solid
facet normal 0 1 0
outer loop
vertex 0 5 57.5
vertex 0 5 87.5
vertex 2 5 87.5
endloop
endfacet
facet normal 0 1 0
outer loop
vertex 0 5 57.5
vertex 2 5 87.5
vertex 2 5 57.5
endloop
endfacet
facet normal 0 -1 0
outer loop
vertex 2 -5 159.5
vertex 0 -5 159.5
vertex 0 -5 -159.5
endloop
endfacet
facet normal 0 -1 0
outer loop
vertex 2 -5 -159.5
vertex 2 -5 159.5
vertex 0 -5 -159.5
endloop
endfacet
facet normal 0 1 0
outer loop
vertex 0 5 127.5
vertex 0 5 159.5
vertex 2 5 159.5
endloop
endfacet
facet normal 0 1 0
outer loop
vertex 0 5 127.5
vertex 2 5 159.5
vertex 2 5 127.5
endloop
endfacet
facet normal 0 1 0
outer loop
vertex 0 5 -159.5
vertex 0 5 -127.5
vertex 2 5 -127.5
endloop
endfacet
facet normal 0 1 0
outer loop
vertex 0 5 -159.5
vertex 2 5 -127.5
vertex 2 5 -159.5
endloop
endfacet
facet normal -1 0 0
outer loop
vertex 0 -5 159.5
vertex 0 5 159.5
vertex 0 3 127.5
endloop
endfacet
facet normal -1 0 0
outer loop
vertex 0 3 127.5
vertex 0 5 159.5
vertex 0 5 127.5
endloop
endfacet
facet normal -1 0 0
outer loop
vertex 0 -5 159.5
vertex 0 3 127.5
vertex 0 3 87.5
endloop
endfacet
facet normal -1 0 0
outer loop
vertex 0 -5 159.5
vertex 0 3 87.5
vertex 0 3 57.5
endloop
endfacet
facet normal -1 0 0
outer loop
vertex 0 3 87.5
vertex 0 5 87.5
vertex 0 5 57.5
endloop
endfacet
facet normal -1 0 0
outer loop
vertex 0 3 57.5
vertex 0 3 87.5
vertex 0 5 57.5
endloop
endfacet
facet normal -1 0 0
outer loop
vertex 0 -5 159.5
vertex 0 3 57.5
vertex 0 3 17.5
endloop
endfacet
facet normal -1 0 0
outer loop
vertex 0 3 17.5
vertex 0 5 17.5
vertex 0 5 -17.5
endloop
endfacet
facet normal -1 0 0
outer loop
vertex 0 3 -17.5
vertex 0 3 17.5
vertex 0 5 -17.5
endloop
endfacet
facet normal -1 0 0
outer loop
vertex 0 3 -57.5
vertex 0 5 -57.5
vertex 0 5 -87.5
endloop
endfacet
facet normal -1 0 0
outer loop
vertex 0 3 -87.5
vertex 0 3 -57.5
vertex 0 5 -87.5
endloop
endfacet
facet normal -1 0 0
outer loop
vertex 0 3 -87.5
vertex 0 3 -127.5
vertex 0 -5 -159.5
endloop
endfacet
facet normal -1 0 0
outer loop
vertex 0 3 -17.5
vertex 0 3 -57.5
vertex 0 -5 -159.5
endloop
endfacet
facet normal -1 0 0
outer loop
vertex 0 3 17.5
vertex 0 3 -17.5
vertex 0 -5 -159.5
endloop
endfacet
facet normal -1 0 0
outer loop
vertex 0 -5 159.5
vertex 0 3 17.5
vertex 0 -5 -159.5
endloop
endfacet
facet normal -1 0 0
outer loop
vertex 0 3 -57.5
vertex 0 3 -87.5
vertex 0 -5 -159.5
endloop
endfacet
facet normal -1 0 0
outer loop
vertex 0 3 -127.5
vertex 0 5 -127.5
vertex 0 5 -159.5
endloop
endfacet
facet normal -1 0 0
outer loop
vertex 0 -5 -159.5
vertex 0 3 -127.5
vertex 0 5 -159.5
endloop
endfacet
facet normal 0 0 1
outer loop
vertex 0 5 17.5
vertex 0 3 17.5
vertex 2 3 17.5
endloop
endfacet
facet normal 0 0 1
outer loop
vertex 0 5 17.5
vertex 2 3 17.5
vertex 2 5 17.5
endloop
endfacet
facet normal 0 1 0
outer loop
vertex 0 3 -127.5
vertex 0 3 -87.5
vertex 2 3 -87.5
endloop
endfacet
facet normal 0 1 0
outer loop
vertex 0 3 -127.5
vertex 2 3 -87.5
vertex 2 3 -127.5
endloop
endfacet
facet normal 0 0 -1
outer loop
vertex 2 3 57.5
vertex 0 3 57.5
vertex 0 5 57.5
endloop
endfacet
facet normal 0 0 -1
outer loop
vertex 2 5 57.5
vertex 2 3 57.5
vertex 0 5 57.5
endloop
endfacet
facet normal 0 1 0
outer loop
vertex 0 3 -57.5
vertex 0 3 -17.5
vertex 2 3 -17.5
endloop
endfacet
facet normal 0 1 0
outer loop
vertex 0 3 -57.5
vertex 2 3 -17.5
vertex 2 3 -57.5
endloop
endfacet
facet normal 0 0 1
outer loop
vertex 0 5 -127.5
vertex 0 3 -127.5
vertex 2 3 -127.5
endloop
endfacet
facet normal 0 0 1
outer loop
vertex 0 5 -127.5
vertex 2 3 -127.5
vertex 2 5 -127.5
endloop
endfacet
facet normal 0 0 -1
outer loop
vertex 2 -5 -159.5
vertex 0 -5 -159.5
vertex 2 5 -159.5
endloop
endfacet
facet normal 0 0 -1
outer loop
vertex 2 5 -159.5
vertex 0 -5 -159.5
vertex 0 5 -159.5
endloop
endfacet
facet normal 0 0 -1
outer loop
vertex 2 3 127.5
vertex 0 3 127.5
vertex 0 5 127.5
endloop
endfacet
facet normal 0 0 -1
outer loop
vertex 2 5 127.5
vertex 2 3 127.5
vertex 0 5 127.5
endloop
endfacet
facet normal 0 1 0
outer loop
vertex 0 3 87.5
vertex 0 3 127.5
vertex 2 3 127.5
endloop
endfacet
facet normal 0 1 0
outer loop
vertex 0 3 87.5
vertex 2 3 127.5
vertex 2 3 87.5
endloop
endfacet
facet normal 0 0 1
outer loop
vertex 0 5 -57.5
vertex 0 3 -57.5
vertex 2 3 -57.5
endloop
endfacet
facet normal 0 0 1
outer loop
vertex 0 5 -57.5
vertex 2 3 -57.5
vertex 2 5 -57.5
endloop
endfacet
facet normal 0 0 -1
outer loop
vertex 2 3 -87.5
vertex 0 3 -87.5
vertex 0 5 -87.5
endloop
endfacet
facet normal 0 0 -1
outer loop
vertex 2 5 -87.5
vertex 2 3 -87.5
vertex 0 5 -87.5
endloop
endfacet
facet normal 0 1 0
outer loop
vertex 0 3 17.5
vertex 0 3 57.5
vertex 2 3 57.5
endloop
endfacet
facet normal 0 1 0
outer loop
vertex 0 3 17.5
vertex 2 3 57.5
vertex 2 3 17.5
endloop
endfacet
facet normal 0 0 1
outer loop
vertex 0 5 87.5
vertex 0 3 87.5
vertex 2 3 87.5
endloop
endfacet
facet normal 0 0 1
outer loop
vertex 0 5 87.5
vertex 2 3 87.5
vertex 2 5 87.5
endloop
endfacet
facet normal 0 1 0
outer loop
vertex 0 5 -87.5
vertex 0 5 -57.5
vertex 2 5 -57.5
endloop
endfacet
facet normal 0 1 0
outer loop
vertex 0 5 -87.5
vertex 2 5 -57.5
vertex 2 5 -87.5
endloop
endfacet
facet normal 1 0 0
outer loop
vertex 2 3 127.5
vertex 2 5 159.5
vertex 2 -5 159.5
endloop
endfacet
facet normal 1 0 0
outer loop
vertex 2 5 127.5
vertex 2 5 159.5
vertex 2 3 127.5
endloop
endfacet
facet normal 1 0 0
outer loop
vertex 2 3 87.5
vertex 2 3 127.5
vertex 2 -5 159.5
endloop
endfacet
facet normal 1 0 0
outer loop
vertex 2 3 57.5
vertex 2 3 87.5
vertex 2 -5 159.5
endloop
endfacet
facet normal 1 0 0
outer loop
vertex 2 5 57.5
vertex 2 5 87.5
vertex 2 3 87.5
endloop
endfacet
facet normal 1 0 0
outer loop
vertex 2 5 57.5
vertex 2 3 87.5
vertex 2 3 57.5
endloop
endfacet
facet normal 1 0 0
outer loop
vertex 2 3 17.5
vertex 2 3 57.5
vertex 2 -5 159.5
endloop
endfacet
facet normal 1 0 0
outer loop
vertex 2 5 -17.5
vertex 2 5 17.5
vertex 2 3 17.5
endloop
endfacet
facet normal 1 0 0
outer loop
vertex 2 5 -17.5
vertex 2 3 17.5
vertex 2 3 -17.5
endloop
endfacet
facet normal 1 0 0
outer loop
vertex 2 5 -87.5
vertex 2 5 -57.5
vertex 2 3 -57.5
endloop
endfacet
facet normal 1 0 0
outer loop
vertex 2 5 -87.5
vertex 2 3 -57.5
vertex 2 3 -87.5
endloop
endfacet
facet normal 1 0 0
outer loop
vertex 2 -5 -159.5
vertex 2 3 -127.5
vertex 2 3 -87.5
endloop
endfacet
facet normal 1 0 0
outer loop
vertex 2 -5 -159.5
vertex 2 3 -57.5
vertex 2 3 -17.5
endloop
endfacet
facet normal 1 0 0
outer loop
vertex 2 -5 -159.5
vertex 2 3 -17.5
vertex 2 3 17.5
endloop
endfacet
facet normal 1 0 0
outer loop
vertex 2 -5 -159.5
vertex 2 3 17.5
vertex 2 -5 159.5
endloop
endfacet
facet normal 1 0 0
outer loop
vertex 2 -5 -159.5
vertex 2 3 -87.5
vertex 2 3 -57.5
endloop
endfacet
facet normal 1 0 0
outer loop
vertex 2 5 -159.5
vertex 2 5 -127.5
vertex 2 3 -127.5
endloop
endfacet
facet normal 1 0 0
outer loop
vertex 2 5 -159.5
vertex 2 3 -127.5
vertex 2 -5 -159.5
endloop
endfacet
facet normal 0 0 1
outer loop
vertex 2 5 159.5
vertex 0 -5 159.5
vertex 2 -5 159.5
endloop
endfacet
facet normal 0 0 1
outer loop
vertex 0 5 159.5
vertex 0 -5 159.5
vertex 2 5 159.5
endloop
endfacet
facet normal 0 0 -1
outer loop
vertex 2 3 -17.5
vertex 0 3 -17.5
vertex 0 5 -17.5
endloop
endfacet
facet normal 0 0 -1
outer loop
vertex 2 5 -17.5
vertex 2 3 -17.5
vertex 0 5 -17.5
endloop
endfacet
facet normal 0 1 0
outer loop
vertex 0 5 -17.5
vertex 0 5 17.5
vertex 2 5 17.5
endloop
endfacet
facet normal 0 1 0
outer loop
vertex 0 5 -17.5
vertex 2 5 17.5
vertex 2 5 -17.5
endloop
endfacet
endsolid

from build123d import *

# Parameters (mm, degrees)
SKETCH1_W               = 319
SKETCH1_H               = 10
BOSS_EXTRUDE1_DEPTH     = 2
CUT_EXTRUDE1_DEPTH      = 160.590883198
CUT_EXTRUDE1_DEPTH_BACK = 160.590883198
SKETCH2_W               = 40
SKETCH2_H               = 2


with BuildPart() as part:
    # Sketch1 → Boss-Extrude1 (new body)
    with BuildSketch(Plane(origin=(0, 0, 0), x_dir=(0, 0, -1), z_dir=(1, 0, 0))):
        Rectangle(SKETCH1_W, SKETCH1_H)
    extrude(amount=BOSS_EXTRUDE1_DEPTH)

    # Sketch2 → Cut-Extrude1 (cut, two sides: drawn at the far end of the back side and taken through both)
    with BuildSketch(Plane(origin=(2, 0, 0), x_dir=(0, 0, -1), z_dir=(1, 0, 0)).offset(-CUT_EXTRUDE1_DEPTH_BACK)):
        with Locations((-107.5, 4)):
            Rectangle(SKETCH2_W, SKETCH2_H)
        with Locations((-37.5, 4)):
            Rectangle(SKETCH2_W, SKETCH2_H)
        with Locations((37.5, 4)):
            Rectangle(SKETCH2_W, SKETCH2_H)
        with Locations((107.5, 4)):
            Rectangle(SKETCH2_W, SKETCH2_H)
    extrude(amount=CUT_EXTRUDE1_DEPTH + CUT_EXTRUDE1_DEPTH_BACK, mode=Mode.SUBTRACT)


solid = part.part
